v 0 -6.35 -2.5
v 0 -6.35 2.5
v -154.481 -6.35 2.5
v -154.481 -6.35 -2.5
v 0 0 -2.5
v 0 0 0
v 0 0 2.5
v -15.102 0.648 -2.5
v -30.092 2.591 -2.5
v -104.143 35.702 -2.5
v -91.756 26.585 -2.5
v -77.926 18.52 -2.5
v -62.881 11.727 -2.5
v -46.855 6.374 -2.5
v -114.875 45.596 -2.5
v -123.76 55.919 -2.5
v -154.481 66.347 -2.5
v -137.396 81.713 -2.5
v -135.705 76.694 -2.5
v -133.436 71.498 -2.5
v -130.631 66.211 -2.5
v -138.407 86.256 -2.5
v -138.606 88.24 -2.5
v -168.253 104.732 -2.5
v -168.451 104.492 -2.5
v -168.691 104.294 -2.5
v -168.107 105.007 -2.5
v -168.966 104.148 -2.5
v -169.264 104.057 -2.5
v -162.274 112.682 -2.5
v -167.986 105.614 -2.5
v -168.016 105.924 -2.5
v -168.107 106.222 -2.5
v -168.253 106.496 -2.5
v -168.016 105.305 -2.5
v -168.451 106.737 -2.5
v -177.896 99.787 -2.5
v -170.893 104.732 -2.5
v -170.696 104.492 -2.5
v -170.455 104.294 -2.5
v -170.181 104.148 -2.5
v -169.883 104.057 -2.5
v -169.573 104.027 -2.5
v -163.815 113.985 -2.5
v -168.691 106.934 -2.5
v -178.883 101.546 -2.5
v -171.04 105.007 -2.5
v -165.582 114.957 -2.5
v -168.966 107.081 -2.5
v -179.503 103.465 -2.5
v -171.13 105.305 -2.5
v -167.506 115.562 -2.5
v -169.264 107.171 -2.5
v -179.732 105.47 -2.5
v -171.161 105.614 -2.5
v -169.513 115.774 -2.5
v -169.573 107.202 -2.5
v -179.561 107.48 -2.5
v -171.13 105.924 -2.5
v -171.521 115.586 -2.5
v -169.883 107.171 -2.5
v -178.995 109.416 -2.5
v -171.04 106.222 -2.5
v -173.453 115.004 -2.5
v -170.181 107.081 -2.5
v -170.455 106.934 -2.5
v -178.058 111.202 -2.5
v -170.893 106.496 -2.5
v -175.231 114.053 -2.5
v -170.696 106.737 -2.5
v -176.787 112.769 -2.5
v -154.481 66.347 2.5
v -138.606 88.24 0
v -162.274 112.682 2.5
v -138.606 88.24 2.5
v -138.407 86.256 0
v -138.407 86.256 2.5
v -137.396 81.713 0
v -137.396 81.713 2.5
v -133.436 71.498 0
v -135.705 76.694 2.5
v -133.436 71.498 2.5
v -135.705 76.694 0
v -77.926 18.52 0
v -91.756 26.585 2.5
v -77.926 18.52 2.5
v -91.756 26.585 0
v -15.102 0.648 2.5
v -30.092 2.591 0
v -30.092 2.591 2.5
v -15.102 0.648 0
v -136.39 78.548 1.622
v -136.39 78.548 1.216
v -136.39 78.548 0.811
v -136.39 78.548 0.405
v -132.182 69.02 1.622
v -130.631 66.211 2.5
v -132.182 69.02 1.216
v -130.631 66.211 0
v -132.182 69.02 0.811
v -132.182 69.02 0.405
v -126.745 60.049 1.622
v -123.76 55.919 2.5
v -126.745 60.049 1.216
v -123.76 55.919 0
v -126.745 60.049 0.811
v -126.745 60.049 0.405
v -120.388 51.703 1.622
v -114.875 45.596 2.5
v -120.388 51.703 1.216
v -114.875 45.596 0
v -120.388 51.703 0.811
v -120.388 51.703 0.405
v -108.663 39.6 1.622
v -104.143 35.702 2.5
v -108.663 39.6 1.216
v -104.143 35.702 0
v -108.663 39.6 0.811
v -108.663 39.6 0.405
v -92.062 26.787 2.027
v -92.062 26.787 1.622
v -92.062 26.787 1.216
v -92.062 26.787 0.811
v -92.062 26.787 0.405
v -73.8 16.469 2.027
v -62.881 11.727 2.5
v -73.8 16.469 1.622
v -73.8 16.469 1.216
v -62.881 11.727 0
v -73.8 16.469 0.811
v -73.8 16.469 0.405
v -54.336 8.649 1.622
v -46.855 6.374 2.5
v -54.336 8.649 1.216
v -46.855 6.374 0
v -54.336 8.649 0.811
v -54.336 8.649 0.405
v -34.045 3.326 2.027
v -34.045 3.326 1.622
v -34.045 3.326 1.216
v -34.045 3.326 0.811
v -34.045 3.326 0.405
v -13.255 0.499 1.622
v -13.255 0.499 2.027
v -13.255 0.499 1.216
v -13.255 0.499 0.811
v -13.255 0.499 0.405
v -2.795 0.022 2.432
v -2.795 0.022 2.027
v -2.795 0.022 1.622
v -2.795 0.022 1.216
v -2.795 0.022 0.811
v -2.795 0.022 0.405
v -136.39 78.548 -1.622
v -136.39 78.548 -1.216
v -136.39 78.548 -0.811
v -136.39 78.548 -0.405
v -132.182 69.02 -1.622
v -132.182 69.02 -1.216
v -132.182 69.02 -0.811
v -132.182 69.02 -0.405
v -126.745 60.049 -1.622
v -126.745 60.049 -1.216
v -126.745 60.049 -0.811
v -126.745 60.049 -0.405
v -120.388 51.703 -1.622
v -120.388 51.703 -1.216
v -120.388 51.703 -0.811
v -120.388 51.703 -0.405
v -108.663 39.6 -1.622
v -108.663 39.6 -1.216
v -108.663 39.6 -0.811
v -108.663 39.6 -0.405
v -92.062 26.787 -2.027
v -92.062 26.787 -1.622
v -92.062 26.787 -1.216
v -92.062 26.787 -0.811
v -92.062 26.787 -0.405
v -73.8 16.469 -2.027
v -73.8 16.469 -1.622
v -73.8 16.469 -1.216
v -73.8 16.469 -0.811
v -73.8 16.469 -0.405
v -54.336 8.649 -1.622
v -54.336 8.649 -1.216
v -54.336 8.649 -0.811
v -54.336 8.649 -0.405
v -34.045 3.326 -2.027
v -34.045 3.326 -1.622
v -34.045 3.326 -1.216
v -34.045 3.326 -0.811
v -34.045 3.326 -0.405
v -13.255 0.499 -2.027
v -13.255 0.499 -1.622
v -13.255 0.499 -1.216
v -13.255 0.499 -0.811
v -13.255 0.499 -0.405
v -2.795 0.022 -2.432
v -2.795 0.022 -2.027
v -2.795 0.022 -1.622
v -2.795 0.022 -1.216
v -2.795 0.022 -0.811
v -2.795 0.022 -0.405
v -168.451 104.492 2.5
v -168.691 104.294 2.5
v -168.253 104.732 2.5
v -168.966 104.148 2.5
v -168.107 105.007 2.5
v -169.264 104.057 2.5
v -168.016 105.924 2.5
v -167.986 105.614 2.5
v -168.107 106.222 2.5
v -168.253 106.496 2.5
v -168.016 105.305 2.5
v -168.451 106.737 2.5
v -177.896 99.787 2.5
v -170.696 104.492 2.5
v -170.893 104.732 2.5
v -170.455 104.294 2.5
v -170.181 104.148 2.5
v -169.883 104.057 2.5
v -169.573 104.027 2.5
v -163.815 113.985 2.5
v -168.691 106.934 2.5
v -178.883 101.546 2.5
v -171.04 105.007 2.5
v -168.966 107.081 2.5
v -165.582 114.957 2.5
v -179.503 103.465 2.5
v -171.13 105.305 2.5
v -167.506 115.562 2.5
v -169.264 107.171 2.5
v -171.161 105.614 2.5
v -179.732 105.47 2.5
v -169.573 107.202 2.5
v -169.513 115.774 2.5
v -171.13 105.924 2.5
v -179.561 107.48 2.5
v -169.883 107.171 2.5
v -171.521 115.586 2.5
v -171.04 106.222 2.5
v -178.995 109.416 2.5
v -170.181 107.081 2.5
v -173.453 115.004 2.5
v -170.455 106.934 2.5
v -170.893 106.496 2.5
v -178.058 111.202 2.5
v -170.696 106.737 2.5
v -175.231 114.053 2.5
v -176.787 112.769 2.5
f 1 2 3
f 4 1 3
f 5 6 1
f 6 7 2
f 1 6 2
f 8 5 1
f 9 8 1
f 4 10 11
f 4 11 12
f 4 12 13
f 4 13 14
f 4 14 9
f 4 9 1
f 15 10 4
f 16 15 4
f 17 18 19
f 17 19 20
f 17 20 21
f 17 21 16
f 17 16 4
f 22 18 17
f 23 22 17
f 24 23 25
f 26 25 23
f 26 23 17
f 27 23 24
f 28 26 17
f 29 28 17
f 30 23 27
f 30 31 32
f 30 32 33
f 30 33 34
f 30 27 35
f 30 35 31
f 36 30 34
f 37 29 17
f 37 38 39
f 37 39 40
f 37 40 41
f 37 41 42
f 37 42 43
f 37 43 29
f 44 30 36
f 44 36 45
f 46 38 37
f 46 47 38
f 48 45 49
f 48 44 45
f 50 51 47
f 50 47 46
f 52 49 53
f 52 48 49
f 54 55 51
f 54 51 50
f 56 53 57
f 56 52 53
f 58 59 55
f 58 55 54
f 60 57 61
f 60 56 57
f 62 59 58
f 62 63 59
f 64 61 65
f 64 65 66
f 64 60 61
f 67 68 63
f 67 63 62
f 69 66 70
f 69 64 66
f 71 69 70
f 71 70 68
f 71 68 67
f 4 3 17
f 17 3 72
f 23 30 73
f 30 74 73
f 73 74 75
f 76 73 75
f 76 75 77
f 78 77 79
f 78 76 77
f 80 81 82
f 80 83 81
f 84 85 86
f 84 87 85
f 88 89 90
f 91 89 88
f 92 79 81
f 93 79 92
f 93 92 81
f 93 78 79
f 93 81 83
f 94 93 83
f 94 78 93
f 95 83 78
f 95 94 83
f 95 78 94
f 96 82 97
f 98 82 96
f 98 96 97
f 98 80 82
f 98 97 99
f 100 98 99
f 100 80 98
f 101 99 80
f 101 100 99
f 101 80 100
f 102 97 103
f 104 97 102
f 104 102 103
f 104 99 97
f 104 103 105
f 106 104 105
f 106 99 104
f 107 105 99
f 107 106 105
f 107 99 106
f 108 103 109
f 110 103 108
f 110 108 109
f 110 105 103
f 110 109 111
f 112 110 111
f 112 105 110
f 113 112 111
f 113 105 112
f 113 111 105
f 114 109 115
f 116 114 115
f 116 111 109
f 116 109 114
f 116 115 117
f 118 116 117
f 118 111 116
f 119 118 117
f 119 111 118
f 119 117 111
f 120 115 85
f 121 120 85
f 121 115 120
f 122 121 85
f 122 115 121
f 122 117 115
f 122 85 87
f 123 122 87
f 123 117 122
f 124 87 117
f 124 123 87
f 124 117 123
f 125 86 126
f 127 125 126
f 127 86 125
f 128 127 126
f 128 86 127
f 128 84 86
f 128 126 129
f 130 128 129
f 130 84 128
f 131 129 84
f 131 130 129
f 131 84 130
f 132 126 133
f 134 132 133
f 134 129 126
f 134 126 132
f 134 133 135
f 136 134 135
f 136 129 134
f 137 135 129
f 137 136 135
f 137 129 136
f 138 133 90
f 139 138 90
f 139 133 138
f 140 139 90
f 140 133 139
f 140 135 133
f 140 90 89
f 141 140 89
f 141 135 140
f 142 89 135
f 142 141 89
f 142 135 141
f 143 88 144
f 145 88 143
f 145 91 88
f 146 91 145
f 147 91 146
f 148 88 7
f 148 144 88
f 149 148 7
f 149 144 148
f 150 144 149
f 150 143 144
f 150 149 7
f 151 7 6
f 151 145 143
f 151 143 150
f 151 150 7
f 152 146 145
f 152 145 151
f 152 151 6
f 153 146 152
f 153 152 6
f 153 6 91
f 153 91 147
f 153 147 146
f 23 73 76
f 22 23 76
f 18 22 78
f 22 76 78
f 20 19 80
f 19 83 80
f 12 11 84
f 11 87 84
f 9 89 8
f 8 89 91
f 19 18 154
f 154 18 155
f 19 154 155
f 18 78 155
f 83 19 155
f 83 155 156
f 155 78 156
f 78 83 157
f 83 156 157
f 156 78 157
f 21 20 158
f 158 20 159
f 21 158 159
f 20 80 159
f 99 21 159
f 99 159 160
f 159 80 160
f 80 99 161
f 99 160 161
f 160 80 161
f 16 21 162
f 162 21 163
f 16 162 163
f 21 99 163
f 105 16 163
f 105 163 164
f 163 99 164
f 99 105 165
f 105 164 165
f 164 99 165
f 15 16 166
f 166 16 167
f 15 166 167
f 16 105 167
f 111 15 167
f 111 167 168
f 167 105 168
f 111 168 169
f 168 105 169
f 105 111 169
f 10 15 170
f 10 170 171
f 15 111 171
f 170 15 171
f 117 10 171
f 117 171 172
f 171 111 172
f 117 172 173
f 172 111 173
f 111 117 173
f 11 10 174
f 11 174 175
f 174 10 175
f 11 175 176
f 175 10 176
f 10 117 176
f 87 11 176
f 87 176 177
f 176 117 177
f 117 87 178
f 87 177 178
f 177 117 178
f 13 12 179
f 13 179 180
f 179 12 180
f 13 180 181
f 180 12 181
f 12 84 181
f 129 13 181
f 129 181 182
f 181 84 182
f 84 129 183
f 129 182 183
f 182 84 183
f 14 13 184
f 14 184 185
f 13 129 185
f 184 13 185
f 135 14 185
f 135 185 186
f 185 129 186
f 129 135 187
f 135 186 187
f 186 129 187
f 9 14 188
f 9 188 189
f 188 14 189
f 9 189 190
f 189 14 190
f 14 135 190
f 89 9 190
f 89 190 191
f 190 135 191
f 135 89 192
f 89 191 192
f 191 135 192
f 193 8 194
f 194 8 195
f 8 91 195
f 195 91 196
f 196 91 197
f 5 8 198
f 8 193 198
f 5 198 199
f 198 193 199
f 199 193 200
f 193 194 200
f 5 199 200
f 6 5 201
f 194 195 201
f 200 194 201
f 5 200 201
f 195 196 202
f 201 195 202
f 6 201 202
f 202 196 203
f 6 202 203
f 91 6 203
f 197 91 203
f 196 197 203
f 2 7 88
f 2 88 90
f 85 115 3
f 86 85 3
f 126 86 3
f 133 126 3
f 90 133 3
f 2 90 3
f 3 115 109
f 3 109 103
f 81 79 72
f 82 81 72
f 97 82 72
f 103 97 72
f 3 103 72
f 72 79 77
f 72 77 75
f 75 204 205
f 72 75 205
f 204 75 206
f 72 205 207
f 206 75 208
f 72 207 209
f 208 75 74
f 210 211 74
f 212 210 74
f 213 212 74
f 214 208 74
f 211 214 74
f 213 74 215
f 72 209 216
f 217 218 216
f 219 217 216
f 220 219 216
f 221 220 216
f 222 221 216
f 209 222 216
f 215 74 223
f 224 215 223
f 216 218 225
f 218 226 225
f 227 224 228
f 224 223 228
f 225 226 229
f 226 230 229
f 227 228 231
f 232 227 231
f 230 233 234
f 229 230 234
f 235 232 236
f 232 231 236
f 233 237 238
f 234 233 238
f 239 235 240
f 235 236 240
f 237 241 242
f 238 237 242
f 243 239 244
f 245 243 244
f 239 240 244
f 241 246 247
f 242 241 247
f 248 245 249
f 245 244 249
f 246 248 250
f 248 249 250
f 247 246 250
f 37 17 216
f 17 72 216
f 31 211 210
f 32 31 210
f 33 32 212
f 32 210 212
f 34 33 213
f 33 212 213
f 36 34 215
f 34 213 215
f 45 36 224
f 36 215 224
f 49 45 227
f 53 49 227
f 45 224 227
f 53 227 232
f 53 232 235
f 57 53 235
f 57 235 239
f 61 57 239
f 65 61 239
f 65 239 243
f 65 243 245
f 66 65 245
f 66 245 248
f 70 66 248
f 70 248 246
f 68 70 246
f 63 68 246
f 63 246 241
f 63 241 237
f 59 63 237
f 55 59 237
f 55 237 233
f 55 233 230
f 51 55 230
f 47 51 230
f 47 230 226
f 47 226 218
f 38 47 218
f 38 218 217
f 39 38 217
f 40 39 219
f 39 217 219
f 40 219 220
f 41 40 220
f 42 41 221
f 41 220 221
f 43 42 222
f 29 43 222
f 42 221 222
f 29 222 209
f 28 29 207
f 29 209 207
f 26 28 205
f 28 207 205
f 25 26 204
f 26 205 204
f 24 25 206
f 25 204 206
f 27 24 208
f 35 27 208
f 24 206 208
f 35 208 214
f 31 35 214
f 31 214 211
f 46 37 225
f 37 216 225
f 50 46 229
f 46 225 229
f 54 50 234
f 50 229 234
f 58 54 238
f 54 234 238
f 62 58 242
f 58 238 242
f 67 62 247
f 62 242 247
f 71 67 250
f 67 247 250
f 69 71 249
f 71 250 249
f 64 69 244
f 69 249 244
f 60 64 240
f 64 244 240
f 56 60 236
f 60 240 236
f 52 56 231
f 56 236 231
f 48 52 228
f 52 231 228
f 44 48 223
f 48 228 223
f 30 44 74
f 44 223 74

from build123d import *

# Parameters (mm, degrees)
BOSS_EXTRUDE1_DEPTH = 2.5
SKETCH3_R           = 1.5875
CUT_EXTRUDE1_DEPTH  = 214.852130583


with BuildPart() as part:
    # Sketch1 → Boss-Extrude1 (new, symmetric)
    with BuildSketch(Plane.XY):
        with BuildLine():
            Line((-154.481439558, -6.35), (-154.481439558, 66.347378373))
            Line((-154.481439558, 66.347378373), (-177.895895312, 99.786686688))
            ThreePointArc((-177.895895312, 99.786686688), (-176.041196233, 113.449531488), (-162.274426085, 112.681888078))
            Line((-162.274426085, 112.681888078), (-138.606439558, 88.2396))
            add(Edge.make_bspline(
                [(-138.606439558, 88.2396), (-138.606439558, 88.206480064), (-138.604893224, 88.134332137), (-138.597757085, 87.982040168), (-138.584504009, 87.767973581), (-138.563362589, 87.511833211), (-138.514302662, 87.023426652), (-138.425196169, 86.336581908), (-138.262733573, 85.340165391), (-137.997774346, 84.039042844), (-137.543893872, 82.163940465), (-136.709143666, 79.332808223), (-135.381511976, 75.692405853), (-133.427089014, 71.311625777), (-130.978665346, 66.686011286), (-128.248792738, 62.200876138), (-125.278396767, 57.871801388), (-121.922980854, 53.47598485), (-117.499907722, 48.25477976), (-111.846477366, 42.372548658), (-104.806706424, 36.032698765), (-96.481239759, 29.625824358), (-87.711829988, 23.843138375), (-78.562226684, 18.684637722), (-69.088219119, 14.150320925), (-59.340712588, 10.240190432), (-49.365347684, 6.954244107), (-41.111501611, 4.791563651), (-34.694119901, 3.420549472), (-30.177735786, 2.597379945), (-27.586849558, 2.166008761), (-24.349433278, 1.675559443), (-20.435573897, 1.165043535), (-15.888225625, 0.68322541), (-11.278370624, 0.337947753), (-7.392012303, 0.139524343), (-4.35262006, 0.048647043), (-2.477110072, 0.012428268), (-0.93320285, 0.001817838), (-0.315317676, 0), (0, 0)],
                knots=[0, 0, 0, 0, 0, 0.000750682, 0.001501364, 0.003002728, 0.004504092, 0.006005456, 0.011632897, 0.017260339, 0.025307868, 0.033355398, 0.051377592, 0.078047856, 0.105080676, 0.132113154, 0.15914583, 0.186178382, 0.213211084, 0.24601624, 0.3000815, 0.354146872, 0.408211991, 0.462277325, 0.516342503, 0.570407831, 0.624473028, 0.67853828, 0.732603517, 0.746119838, 0.759636158, 0.773152478, 0.786668798, 0.813701417, 0.840734035, 0.867766658, 0.88128297, 0.894799281, 0.901946134, 0.909092986, 0.909092986, 0.909092986, 0.909092986, 0.909092986], degree=4))
            Line((0, 0), (0, -6.35))
            Line((0, -6.35), (-154.481439558, -6.35))
        make_face()
    extrude(amount=BOSS_EXTRUDE1_DEPTH, both=True)

    # Sketch3 → Cut-Extrude1 (cut, through all)
    with BuildSketch(Plane.XY.offset(2.5)):
        with Locations((-169.573310542, 105.614223281)):
            Circle(SKETCH3_R)
    extrude(amount=-CUT_EXTRUDE1_DEPTH, mode=Mode.SUBTRACT)


solid = part.part
